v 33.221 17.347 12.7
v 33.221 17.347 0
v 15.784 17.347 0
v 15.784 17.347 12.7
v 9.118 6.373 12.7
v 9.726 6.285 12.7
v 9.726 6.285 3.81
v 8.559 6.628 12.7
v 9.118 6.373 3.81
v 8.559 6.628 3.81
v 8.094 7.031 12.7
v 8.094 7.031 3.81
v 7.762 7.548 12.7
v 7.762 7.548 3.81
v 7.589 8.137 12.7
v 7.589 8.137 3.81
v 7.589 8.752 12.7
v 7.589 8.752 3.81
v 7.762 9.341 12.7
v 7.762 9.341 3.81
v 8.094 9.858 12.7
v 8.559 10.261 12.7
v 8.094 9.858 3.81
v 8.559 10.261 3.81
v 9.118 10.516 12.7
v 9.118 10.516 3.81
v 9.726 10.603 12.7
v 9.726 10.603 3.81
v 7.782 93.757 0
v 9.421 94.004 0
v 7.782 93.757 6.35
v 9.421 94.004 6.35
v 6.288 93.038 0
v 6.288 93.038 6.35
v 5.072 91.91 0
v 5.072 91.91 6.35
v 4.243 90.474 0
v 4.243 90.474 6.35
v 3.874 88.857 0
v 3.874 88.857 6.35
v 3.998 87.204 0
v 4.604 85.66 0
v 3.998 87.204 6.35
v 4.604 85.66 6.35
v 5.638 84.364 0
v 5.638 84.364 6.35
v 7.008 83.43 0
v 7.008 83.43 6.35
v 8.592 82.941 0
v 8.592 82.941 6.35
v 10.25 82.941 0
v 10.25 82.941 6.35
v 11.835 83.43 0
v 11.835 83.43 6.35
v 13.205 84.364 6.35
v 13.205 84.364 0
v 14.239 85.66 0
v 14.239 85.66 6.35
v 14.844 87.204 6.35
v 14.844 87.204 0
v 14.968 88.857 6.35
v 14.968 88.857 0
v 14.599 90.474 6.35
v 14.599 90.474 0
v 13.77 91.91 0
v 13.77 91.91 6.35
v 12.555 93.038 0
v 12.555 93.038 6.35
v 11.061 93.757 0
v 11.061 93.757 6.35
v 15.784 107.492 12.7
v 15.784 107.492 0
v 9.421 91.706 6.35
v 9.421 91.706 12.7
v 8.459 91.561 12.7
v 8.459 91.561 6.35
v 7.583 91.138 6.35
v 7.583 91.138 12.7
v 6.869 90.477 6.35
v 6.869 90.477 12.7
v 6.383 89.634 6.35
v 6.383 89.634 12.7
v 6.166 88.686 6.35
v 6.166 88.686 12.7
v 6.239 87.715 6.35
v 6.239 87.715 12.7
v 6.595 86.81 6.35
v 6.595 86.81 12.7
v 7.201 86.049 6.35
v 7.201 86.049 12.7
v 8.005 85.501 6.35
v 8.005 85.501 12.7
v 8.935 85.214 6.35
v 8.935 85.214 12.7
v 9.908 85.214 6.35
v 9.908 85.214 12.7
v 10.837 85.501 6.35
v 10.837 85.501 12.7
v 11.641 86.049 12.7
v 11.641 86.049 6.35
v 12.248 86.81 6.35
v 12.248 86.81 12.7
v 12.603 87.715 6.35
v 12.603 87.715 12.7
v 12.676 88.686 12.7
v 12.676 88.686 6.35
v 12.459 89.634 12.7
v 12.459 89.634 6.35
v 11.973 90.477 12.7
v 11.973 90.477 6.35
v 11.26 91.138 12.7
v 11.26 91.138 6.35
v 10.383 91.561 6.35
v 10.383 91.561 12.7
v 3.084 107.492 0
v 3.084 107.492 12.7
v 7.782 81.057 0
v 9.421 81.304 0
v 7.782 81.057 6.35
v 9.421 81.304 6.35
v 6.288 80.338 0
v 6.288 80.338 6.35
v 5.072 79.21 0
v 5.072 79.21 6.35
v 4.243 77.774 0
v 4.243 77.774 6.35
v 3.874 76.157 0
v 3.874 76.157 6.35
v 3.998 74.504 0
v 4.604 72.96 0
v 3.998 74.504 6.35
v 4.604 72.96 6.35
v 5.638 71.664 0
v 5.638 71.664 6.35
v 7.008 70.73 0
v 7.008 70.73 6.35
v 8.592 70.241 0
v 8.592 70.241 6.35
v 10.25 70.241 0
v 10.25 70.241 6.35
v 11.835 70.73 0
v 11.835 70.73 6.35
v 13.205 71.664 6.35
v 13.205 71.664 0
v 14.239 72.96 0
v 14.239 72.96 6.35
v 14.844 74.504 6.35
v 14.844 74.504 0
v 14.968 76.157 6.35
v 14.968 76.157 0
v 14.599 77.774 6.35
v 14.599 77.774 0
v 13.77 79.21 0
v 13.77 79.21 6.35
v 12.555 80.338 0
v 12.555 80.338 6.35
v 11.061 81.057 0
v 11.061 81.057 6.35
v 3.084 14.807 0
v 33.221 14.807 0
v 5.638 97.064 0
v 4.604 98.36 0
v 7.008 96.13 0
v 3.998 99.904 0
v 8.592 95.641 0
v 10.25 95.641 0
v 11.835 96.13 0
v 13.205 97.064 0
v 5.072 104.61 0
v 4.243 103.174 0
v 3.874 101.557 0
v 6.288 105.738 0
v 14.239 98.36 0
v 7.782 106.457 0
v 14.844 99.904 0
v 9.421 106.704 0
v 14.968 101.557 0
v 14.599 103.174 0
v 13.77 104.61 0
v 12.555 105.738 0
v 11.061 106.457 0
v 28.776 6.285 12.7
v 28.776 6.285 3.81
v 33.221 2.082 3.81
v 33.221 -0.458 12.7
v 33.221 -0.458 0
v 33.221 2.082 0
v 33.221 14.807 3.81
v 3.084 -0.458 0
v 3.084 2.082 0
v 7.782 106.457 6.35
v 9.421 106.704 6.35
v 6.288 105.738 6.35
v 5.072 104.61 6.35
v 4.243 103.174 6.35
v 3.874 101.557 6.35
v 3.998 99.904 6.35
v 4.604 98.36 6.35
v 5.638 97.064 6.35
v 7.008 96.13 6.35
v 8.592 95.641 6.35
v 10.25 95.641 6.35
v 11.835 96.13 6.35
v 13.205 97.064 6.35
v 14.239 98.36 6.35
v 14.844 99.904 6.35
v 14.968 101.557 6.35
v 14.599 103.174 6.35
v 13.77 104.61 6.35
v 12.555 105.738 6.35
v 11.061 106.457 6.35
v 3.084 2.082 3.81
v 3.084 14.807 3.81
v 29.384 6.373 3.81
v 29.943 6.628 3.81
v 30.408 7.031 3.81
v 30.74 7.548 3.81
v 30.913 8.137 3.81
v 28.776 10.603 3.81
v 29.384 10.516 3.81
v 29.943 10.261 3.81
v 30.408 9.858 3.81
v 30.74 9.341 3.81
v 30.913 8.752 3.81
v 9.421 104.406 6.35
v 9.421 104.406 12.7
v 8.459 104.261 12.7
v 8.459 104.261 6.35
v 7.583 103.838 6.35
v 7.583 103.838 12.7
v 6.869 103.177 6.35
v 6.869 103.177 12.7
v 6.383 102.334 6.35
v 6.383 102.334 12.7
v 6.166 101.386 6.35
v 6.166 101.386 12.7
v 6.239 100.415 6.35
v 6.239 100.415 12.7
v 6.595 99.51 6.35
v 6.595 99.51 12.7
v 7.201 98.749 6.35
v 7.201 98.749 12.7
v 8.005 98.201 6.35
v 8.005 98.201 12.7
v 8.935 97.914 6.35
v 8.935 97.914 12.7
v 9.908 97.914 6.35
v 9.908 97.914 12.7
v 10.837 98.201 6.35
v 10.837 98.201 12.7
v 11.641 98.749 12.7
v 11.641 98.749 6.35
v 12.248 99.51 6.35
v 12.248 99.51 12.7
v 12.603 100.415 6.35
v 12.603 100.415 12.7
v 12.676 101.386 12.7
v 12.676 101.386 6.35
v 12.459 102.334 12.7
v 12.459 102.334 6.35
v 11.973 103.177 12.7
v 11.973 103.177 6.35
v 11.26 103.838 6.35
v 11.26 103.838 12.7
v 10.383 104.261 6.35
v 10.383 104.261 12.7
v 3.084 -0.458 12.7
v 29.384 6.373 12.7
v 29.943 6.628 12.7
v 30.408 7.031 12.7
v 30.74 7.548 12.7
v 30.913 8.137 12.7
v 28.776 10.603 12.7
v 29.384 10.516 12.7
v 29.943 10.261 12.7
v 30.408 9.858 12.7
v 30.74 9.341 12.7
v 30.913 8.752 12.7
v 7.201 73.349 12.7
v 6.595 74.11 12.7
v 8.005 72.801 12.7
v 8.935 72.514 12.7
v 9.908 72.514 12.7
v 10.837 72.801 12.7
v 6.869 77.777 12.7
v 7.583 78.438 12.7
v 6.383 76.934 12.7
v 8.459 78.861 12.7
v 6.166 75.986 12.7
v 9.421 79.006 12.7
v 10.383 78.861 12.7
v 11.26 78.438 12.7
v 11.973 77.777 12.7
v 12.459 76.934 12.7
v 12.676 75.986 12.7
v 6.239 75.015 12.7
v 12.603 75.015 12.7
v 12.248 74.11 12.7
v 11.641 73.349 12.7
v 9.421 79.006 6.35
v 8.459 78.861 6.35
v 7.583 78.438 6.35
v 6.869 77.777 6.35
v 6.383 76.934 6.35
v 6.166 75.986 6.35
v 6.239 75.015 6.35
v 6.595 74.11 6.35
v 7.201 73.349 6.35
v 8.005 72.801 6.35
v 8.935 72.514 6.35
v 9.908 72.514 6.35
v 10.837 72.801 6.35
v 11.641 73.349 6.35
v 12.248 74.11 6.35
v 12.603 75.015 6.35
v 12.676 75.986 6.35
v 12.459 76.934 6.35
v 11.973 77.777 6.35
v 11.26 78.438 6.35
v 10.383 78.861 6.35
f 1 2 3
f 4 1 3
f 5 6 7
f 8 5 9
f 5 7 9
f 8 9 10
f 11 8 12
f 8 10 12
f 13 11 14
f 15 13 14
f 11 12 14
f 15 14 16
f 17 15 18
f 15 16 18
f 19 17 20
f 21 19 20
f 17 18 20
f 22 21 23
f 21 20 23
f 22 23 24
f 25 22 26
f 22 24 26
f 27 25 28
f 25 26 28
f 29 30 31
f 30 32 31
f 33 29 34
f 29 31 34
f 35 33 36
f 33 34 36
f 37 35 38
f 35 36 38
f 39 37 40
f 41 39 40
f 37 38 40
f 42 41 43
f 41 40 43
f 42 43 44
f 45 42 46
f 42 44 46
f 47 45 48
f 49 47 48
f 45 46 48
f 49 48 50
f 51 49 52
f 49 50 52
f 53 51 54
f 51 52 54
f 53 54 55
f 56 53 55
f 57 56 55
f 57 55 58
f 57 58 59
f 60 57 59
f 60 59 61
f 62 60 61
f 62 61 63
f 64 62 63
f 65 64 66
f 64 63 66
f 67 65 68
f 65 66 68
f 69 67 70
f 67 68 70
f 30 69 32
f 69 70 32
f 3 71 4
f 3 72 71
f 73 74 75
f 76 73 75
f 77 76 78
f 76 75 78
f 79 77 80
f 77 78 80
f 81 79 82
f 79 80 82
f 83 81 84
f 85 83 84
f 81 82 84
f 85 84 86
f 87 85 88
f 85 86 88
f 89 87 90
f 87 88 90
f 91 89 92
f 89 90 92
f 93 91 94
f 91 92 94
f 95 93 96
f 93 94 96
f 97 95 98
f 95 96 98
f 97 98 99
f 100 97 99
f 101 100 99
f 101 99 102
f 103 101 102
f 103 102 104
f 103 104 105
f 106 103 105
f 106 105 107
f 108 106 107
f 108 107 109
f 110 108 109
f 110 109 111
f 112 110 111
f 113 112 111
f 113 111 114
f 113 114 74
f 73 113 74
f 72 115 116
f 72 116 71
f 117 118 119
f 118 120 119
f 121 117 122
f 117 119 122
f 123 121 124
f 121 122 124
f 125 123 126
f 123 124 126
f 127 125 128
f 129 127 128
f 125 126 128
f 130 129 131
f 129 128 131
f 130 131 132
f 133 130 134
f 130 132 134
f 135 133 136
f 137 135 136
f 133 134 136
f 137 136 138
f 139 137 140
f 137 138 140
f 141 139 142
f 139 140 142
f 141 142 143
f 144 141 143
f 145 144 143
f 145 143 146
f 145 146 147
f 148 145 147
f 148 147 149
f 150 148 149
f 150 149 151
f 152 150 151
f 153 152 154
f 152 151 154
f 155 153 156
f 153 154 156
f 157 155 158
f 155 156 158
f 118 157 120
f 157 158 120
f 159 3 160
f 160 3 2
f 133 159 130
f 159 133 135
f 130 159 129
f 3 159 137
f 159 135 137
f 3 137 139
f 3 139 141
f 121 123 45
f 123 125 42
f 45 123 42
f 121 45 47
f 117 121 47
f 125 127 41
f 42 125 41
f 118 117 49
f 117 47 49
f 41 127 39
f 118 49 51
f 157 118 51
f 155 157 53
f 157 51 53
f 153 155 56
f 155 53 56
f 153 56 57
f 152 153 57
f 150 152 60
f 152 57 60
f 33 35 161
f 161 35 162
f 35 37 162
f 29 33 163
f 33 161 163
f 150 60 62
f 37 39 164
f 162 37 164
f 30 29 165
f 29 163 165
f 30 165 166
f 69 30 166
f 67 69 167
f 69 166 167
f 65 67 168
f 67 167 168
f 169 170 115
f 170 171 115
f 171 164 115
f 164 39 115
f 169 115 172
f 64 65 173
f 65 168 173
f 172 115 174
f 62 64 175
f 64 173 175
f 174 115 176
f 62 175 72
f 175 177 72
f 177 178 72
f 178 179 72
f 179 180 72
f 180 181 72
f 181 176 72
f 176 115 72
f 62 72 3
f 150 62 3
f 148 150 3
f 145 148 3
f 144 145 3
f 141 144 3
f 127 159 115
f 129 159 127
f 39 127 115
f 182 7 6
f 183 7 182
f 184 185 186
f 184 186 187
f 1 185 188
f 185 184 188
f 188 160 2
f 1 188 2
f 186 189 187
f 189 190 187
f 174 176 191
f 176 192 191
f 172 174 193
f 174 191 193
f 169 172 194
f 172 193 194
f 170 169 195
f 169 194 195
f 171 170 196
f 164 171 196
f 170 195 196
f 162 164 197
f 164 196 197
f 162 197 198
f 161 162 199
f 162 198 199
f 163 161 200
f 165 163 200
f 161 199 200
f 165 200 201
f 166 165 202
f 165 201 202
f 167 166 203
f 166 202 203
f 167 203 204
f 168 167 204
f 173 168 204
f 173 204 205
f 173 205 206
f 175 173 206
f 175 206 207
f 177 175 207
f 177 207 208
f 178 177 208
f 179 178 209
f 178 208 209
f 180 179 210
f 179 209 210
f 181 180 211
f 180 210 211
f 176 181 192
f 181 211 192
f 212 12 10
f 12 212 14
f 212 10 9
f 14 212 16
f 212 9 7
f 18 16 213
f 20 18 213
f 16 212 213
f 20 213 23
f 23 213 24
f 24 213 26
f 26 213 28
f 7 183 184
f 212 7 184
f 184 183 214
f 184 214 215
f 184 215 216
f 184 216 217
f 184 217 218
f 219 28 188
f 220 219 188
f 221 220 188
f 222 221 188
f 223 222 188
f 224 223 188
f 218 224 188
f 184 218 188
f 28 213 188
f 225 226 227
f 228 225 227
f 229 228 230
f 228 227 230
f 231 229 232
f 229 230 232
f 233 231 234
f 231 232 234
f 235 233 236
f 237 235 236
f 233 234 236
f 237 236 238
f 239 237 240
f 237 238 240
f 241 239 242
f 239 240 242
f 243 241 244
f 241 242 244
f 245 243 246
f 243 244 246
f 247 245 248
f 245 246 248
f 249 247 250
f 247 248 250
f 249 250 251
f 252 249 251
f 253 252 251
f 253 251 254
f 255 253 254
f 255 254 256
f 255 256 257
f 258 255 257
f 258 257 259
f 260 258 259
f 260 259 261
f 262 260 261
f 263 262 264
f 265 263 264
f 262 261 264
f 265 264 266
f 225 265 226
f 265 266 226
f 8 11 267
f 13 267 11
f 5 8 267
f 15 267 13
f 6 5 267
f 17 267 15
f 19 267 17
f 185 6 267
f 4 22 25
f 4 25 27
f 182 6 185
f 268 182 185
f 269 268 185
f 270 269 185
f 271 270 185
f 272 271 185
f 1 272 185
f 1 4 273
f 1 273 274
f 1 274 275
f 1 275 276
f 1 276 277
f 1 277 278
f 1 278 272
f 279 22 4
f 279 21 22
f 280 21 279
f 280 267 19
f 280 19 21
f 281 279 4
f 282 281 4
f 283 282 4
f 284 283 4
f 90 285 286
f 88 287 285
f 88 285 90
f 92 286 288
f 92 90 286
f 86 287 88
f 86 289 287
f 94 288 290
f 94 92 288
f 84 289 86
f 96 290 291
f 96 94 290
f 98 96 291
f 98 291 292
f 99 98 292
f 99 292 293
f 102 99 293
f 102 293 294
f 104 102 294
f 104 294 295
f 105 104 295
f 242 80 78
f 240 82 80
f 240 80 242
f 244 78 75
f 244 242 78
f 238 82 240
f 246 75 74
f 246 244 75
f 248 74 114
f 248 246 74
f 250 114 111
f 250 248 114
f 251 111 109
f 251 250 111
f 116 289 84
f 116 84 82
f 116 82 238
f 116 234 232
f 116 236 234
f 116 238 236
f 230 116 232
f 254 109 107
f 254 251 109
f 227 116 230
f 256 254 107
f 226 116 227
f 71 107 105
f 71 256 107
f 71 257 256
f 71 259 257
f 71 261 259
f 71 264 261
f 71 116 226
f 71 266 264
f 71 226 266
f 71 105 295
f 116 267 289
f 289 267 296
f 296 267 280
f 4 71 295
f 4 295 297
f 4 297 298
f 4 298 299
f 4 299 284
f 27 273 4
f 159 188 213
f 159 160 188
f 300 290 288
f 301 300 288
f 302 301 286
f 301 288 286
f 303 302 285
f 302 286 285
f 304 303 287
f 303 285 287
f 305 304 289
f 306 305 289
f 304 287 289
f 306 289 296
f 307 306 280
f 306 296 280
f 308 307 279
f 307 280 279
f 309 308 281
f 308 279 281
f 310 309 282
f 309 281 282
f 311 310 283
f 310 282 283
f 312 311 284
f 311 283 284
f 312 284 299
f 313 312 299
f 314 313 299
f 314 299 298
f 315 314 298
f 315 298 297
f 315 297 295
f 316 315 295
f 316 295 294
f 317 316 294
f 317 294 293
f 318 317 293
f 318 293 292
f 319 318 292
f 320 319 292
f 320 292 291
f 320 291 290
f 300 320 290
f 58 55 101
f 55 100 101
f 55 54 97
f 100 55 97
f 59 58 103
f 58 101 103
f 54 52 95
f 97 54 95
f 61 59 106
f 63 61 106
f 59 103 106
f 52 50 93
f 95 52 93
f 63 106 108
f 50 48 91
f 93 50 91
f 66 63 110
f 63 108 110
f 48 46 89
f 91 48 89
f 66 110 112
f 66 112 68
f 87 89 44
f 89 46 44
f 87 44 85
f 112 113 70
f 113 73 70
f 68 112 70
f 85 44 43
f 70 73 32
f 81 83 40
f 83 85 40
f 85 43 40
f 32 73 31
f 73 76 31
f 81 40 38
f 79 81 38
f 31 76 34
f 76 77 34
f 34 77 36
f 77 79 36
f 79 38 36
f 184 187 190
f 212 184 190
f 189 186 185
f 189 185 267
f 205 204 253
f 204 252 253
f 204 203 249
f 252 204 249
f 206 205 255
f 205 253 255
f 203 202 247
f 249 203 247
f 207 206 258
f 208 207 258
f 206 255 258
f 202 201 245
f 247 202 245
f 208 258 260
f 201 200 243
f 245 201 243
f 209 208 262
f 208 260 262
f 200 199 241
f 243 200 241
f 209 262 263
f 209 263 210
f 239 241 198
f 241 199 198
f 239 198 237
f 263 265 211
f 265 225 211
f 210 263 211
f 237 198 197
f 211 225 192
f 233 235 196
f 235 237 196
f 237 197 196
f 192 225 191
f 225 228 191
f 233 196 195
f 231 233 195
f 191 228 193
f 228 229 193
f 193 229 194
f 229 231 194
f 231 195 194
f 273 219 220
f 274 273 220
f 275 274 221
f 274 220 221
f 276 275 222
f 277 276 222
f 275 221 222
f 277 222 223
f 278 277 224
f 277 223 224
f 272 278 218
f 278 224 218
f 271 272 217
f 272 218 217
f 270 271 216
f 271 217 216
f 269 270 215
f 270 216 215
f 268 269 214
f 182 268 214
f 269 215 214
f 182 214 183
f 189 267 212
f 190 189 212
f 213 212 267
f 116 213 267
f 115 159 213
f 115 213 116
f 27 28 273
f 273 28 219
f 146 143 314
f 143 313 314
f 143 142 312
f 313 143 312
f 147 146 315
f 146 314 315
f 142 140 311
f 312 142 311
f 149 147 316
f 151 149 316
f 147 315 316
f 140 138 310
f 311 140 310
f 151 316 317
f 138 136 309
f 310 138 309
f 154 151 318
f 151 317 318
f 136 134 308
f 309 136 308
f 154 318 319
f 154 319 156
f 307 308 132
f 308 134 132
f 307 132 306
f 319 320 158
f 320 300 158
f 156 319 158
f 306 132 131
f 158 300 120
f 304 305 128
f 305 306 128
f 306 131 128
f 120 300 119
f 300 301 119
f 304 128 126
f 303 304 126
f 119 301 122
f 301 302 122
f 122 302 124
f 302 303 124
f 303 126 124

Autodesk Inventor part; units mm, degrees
ref_plane "YZ Plane" through (0, 0, 0) normal (1, 0, 0) x (0, 1, 0)
ref_plane "XZ Plane" through (0, 0, 0) normal (0, 1, 0) x (-1, 0, 0)
ref_plane "XY Plane" through (0, 0, 0) normal (0, 0, 1) x (1, 0, 0)
sketch "Sketch1" plane through (0, 0, 0) normal (0, 0, 1) x (1, 0, 0)
  line L0 (3.0839, 107.4917) -> (15.7839, 107.4917)
  line L1 (15.7839, 107.4917) -> (15.7839, -0.4583)
  line L2 (15.7839, -0.4583) -> (3.0839, -0.4583)
  line L3 (3.0839, -0.4583) -> (3.0839, 107.4917)
  line L4 (33.221, 2.0817) -> (3.0839, 2.0817)
  line L5 (33.221, 14.8071) -> (3.0839, 14.8071)
  line L6 (15.7839, -0.4583) -> (33.221, -0.4583)
  line L7 (33.221, -0.4583) -> (33.221, 17.3471)
  line L8 (33.221, 17.3471) -> (15.7839, 17.3471)
  circle A0 centre (28.776, 8.4444) radius 2.159
  circle A1 centre (9.726, 8.4444) radius 2.159
  line L9 (9.726, 6.2854) -> (28.776, 6.2854)
  line L10 (9.726, 10.6034) -> (28.776, 10.6034)
  point P0 (9.4212, 101.1417)
  point P1 (9.4212, 88.4417)
  point P2 (9.4212, 75.7417)
  point P3 (15.7839, 2.0817)
  point P4 (15.7839, 14.8071)
  dimension "d0" = 12.7
  dimension "d1" = 107.95
  dimension "d2" = 6.35
  dimension "d3" = 12.7
  dimension "d4" = 6.3626
  dimension "d5" = 6.3626
  dimension "d6" = 6.3626
  dimension "d7" = 12.7
  dimension "d17" = 2.54
  dimension "d18" = 12.7254
  dimension "d21" = 17.4371
  dimension "d22" = 2.54
  dimension "d23" = 4.318
  dimension "d24" = 6.3627
  dimension "d25" = 4.445
  dimension "d26" = 4.318
  dimension "d27" = 6.3627
  dimension "d28" = 19.05
extrude "Extrusion1" add sketch "Sketch1" along normal blind 12.7
hole "Hole1" at (9.4212, 101.1417, 0) at (9.4212, 88.4417, 0) at (9.4212, 75.7417, 0) direction (0, 0, 1) diameter 6.5278 end through all counterbore diameter 11.1252 counterbore depth 6.35 clearance for "Socket Head Cap Screw" size "1/4" standard "Ansi Unified Screw Threads"
extrude "Extrusion2" cut sketch "Sketch1" along normal blind 3.81 contours L5 L1 L10 A1 L9 L4 L3 | L5 L7 L4 L1 L9 A0 L10 | L10 A0 L9 L1 | L1 L9 A1 L10 | A1 | A0
extrude "Extrusion3" cut sketch "Sketch1" along normal through all contours L10 A0 L9 L1 | L1 L9 A1 L10 | A1 | A0
equation "\"d29\" = d27"
properties part number "J005772" material "STAINLESS STEEL, 17-4, H900"
